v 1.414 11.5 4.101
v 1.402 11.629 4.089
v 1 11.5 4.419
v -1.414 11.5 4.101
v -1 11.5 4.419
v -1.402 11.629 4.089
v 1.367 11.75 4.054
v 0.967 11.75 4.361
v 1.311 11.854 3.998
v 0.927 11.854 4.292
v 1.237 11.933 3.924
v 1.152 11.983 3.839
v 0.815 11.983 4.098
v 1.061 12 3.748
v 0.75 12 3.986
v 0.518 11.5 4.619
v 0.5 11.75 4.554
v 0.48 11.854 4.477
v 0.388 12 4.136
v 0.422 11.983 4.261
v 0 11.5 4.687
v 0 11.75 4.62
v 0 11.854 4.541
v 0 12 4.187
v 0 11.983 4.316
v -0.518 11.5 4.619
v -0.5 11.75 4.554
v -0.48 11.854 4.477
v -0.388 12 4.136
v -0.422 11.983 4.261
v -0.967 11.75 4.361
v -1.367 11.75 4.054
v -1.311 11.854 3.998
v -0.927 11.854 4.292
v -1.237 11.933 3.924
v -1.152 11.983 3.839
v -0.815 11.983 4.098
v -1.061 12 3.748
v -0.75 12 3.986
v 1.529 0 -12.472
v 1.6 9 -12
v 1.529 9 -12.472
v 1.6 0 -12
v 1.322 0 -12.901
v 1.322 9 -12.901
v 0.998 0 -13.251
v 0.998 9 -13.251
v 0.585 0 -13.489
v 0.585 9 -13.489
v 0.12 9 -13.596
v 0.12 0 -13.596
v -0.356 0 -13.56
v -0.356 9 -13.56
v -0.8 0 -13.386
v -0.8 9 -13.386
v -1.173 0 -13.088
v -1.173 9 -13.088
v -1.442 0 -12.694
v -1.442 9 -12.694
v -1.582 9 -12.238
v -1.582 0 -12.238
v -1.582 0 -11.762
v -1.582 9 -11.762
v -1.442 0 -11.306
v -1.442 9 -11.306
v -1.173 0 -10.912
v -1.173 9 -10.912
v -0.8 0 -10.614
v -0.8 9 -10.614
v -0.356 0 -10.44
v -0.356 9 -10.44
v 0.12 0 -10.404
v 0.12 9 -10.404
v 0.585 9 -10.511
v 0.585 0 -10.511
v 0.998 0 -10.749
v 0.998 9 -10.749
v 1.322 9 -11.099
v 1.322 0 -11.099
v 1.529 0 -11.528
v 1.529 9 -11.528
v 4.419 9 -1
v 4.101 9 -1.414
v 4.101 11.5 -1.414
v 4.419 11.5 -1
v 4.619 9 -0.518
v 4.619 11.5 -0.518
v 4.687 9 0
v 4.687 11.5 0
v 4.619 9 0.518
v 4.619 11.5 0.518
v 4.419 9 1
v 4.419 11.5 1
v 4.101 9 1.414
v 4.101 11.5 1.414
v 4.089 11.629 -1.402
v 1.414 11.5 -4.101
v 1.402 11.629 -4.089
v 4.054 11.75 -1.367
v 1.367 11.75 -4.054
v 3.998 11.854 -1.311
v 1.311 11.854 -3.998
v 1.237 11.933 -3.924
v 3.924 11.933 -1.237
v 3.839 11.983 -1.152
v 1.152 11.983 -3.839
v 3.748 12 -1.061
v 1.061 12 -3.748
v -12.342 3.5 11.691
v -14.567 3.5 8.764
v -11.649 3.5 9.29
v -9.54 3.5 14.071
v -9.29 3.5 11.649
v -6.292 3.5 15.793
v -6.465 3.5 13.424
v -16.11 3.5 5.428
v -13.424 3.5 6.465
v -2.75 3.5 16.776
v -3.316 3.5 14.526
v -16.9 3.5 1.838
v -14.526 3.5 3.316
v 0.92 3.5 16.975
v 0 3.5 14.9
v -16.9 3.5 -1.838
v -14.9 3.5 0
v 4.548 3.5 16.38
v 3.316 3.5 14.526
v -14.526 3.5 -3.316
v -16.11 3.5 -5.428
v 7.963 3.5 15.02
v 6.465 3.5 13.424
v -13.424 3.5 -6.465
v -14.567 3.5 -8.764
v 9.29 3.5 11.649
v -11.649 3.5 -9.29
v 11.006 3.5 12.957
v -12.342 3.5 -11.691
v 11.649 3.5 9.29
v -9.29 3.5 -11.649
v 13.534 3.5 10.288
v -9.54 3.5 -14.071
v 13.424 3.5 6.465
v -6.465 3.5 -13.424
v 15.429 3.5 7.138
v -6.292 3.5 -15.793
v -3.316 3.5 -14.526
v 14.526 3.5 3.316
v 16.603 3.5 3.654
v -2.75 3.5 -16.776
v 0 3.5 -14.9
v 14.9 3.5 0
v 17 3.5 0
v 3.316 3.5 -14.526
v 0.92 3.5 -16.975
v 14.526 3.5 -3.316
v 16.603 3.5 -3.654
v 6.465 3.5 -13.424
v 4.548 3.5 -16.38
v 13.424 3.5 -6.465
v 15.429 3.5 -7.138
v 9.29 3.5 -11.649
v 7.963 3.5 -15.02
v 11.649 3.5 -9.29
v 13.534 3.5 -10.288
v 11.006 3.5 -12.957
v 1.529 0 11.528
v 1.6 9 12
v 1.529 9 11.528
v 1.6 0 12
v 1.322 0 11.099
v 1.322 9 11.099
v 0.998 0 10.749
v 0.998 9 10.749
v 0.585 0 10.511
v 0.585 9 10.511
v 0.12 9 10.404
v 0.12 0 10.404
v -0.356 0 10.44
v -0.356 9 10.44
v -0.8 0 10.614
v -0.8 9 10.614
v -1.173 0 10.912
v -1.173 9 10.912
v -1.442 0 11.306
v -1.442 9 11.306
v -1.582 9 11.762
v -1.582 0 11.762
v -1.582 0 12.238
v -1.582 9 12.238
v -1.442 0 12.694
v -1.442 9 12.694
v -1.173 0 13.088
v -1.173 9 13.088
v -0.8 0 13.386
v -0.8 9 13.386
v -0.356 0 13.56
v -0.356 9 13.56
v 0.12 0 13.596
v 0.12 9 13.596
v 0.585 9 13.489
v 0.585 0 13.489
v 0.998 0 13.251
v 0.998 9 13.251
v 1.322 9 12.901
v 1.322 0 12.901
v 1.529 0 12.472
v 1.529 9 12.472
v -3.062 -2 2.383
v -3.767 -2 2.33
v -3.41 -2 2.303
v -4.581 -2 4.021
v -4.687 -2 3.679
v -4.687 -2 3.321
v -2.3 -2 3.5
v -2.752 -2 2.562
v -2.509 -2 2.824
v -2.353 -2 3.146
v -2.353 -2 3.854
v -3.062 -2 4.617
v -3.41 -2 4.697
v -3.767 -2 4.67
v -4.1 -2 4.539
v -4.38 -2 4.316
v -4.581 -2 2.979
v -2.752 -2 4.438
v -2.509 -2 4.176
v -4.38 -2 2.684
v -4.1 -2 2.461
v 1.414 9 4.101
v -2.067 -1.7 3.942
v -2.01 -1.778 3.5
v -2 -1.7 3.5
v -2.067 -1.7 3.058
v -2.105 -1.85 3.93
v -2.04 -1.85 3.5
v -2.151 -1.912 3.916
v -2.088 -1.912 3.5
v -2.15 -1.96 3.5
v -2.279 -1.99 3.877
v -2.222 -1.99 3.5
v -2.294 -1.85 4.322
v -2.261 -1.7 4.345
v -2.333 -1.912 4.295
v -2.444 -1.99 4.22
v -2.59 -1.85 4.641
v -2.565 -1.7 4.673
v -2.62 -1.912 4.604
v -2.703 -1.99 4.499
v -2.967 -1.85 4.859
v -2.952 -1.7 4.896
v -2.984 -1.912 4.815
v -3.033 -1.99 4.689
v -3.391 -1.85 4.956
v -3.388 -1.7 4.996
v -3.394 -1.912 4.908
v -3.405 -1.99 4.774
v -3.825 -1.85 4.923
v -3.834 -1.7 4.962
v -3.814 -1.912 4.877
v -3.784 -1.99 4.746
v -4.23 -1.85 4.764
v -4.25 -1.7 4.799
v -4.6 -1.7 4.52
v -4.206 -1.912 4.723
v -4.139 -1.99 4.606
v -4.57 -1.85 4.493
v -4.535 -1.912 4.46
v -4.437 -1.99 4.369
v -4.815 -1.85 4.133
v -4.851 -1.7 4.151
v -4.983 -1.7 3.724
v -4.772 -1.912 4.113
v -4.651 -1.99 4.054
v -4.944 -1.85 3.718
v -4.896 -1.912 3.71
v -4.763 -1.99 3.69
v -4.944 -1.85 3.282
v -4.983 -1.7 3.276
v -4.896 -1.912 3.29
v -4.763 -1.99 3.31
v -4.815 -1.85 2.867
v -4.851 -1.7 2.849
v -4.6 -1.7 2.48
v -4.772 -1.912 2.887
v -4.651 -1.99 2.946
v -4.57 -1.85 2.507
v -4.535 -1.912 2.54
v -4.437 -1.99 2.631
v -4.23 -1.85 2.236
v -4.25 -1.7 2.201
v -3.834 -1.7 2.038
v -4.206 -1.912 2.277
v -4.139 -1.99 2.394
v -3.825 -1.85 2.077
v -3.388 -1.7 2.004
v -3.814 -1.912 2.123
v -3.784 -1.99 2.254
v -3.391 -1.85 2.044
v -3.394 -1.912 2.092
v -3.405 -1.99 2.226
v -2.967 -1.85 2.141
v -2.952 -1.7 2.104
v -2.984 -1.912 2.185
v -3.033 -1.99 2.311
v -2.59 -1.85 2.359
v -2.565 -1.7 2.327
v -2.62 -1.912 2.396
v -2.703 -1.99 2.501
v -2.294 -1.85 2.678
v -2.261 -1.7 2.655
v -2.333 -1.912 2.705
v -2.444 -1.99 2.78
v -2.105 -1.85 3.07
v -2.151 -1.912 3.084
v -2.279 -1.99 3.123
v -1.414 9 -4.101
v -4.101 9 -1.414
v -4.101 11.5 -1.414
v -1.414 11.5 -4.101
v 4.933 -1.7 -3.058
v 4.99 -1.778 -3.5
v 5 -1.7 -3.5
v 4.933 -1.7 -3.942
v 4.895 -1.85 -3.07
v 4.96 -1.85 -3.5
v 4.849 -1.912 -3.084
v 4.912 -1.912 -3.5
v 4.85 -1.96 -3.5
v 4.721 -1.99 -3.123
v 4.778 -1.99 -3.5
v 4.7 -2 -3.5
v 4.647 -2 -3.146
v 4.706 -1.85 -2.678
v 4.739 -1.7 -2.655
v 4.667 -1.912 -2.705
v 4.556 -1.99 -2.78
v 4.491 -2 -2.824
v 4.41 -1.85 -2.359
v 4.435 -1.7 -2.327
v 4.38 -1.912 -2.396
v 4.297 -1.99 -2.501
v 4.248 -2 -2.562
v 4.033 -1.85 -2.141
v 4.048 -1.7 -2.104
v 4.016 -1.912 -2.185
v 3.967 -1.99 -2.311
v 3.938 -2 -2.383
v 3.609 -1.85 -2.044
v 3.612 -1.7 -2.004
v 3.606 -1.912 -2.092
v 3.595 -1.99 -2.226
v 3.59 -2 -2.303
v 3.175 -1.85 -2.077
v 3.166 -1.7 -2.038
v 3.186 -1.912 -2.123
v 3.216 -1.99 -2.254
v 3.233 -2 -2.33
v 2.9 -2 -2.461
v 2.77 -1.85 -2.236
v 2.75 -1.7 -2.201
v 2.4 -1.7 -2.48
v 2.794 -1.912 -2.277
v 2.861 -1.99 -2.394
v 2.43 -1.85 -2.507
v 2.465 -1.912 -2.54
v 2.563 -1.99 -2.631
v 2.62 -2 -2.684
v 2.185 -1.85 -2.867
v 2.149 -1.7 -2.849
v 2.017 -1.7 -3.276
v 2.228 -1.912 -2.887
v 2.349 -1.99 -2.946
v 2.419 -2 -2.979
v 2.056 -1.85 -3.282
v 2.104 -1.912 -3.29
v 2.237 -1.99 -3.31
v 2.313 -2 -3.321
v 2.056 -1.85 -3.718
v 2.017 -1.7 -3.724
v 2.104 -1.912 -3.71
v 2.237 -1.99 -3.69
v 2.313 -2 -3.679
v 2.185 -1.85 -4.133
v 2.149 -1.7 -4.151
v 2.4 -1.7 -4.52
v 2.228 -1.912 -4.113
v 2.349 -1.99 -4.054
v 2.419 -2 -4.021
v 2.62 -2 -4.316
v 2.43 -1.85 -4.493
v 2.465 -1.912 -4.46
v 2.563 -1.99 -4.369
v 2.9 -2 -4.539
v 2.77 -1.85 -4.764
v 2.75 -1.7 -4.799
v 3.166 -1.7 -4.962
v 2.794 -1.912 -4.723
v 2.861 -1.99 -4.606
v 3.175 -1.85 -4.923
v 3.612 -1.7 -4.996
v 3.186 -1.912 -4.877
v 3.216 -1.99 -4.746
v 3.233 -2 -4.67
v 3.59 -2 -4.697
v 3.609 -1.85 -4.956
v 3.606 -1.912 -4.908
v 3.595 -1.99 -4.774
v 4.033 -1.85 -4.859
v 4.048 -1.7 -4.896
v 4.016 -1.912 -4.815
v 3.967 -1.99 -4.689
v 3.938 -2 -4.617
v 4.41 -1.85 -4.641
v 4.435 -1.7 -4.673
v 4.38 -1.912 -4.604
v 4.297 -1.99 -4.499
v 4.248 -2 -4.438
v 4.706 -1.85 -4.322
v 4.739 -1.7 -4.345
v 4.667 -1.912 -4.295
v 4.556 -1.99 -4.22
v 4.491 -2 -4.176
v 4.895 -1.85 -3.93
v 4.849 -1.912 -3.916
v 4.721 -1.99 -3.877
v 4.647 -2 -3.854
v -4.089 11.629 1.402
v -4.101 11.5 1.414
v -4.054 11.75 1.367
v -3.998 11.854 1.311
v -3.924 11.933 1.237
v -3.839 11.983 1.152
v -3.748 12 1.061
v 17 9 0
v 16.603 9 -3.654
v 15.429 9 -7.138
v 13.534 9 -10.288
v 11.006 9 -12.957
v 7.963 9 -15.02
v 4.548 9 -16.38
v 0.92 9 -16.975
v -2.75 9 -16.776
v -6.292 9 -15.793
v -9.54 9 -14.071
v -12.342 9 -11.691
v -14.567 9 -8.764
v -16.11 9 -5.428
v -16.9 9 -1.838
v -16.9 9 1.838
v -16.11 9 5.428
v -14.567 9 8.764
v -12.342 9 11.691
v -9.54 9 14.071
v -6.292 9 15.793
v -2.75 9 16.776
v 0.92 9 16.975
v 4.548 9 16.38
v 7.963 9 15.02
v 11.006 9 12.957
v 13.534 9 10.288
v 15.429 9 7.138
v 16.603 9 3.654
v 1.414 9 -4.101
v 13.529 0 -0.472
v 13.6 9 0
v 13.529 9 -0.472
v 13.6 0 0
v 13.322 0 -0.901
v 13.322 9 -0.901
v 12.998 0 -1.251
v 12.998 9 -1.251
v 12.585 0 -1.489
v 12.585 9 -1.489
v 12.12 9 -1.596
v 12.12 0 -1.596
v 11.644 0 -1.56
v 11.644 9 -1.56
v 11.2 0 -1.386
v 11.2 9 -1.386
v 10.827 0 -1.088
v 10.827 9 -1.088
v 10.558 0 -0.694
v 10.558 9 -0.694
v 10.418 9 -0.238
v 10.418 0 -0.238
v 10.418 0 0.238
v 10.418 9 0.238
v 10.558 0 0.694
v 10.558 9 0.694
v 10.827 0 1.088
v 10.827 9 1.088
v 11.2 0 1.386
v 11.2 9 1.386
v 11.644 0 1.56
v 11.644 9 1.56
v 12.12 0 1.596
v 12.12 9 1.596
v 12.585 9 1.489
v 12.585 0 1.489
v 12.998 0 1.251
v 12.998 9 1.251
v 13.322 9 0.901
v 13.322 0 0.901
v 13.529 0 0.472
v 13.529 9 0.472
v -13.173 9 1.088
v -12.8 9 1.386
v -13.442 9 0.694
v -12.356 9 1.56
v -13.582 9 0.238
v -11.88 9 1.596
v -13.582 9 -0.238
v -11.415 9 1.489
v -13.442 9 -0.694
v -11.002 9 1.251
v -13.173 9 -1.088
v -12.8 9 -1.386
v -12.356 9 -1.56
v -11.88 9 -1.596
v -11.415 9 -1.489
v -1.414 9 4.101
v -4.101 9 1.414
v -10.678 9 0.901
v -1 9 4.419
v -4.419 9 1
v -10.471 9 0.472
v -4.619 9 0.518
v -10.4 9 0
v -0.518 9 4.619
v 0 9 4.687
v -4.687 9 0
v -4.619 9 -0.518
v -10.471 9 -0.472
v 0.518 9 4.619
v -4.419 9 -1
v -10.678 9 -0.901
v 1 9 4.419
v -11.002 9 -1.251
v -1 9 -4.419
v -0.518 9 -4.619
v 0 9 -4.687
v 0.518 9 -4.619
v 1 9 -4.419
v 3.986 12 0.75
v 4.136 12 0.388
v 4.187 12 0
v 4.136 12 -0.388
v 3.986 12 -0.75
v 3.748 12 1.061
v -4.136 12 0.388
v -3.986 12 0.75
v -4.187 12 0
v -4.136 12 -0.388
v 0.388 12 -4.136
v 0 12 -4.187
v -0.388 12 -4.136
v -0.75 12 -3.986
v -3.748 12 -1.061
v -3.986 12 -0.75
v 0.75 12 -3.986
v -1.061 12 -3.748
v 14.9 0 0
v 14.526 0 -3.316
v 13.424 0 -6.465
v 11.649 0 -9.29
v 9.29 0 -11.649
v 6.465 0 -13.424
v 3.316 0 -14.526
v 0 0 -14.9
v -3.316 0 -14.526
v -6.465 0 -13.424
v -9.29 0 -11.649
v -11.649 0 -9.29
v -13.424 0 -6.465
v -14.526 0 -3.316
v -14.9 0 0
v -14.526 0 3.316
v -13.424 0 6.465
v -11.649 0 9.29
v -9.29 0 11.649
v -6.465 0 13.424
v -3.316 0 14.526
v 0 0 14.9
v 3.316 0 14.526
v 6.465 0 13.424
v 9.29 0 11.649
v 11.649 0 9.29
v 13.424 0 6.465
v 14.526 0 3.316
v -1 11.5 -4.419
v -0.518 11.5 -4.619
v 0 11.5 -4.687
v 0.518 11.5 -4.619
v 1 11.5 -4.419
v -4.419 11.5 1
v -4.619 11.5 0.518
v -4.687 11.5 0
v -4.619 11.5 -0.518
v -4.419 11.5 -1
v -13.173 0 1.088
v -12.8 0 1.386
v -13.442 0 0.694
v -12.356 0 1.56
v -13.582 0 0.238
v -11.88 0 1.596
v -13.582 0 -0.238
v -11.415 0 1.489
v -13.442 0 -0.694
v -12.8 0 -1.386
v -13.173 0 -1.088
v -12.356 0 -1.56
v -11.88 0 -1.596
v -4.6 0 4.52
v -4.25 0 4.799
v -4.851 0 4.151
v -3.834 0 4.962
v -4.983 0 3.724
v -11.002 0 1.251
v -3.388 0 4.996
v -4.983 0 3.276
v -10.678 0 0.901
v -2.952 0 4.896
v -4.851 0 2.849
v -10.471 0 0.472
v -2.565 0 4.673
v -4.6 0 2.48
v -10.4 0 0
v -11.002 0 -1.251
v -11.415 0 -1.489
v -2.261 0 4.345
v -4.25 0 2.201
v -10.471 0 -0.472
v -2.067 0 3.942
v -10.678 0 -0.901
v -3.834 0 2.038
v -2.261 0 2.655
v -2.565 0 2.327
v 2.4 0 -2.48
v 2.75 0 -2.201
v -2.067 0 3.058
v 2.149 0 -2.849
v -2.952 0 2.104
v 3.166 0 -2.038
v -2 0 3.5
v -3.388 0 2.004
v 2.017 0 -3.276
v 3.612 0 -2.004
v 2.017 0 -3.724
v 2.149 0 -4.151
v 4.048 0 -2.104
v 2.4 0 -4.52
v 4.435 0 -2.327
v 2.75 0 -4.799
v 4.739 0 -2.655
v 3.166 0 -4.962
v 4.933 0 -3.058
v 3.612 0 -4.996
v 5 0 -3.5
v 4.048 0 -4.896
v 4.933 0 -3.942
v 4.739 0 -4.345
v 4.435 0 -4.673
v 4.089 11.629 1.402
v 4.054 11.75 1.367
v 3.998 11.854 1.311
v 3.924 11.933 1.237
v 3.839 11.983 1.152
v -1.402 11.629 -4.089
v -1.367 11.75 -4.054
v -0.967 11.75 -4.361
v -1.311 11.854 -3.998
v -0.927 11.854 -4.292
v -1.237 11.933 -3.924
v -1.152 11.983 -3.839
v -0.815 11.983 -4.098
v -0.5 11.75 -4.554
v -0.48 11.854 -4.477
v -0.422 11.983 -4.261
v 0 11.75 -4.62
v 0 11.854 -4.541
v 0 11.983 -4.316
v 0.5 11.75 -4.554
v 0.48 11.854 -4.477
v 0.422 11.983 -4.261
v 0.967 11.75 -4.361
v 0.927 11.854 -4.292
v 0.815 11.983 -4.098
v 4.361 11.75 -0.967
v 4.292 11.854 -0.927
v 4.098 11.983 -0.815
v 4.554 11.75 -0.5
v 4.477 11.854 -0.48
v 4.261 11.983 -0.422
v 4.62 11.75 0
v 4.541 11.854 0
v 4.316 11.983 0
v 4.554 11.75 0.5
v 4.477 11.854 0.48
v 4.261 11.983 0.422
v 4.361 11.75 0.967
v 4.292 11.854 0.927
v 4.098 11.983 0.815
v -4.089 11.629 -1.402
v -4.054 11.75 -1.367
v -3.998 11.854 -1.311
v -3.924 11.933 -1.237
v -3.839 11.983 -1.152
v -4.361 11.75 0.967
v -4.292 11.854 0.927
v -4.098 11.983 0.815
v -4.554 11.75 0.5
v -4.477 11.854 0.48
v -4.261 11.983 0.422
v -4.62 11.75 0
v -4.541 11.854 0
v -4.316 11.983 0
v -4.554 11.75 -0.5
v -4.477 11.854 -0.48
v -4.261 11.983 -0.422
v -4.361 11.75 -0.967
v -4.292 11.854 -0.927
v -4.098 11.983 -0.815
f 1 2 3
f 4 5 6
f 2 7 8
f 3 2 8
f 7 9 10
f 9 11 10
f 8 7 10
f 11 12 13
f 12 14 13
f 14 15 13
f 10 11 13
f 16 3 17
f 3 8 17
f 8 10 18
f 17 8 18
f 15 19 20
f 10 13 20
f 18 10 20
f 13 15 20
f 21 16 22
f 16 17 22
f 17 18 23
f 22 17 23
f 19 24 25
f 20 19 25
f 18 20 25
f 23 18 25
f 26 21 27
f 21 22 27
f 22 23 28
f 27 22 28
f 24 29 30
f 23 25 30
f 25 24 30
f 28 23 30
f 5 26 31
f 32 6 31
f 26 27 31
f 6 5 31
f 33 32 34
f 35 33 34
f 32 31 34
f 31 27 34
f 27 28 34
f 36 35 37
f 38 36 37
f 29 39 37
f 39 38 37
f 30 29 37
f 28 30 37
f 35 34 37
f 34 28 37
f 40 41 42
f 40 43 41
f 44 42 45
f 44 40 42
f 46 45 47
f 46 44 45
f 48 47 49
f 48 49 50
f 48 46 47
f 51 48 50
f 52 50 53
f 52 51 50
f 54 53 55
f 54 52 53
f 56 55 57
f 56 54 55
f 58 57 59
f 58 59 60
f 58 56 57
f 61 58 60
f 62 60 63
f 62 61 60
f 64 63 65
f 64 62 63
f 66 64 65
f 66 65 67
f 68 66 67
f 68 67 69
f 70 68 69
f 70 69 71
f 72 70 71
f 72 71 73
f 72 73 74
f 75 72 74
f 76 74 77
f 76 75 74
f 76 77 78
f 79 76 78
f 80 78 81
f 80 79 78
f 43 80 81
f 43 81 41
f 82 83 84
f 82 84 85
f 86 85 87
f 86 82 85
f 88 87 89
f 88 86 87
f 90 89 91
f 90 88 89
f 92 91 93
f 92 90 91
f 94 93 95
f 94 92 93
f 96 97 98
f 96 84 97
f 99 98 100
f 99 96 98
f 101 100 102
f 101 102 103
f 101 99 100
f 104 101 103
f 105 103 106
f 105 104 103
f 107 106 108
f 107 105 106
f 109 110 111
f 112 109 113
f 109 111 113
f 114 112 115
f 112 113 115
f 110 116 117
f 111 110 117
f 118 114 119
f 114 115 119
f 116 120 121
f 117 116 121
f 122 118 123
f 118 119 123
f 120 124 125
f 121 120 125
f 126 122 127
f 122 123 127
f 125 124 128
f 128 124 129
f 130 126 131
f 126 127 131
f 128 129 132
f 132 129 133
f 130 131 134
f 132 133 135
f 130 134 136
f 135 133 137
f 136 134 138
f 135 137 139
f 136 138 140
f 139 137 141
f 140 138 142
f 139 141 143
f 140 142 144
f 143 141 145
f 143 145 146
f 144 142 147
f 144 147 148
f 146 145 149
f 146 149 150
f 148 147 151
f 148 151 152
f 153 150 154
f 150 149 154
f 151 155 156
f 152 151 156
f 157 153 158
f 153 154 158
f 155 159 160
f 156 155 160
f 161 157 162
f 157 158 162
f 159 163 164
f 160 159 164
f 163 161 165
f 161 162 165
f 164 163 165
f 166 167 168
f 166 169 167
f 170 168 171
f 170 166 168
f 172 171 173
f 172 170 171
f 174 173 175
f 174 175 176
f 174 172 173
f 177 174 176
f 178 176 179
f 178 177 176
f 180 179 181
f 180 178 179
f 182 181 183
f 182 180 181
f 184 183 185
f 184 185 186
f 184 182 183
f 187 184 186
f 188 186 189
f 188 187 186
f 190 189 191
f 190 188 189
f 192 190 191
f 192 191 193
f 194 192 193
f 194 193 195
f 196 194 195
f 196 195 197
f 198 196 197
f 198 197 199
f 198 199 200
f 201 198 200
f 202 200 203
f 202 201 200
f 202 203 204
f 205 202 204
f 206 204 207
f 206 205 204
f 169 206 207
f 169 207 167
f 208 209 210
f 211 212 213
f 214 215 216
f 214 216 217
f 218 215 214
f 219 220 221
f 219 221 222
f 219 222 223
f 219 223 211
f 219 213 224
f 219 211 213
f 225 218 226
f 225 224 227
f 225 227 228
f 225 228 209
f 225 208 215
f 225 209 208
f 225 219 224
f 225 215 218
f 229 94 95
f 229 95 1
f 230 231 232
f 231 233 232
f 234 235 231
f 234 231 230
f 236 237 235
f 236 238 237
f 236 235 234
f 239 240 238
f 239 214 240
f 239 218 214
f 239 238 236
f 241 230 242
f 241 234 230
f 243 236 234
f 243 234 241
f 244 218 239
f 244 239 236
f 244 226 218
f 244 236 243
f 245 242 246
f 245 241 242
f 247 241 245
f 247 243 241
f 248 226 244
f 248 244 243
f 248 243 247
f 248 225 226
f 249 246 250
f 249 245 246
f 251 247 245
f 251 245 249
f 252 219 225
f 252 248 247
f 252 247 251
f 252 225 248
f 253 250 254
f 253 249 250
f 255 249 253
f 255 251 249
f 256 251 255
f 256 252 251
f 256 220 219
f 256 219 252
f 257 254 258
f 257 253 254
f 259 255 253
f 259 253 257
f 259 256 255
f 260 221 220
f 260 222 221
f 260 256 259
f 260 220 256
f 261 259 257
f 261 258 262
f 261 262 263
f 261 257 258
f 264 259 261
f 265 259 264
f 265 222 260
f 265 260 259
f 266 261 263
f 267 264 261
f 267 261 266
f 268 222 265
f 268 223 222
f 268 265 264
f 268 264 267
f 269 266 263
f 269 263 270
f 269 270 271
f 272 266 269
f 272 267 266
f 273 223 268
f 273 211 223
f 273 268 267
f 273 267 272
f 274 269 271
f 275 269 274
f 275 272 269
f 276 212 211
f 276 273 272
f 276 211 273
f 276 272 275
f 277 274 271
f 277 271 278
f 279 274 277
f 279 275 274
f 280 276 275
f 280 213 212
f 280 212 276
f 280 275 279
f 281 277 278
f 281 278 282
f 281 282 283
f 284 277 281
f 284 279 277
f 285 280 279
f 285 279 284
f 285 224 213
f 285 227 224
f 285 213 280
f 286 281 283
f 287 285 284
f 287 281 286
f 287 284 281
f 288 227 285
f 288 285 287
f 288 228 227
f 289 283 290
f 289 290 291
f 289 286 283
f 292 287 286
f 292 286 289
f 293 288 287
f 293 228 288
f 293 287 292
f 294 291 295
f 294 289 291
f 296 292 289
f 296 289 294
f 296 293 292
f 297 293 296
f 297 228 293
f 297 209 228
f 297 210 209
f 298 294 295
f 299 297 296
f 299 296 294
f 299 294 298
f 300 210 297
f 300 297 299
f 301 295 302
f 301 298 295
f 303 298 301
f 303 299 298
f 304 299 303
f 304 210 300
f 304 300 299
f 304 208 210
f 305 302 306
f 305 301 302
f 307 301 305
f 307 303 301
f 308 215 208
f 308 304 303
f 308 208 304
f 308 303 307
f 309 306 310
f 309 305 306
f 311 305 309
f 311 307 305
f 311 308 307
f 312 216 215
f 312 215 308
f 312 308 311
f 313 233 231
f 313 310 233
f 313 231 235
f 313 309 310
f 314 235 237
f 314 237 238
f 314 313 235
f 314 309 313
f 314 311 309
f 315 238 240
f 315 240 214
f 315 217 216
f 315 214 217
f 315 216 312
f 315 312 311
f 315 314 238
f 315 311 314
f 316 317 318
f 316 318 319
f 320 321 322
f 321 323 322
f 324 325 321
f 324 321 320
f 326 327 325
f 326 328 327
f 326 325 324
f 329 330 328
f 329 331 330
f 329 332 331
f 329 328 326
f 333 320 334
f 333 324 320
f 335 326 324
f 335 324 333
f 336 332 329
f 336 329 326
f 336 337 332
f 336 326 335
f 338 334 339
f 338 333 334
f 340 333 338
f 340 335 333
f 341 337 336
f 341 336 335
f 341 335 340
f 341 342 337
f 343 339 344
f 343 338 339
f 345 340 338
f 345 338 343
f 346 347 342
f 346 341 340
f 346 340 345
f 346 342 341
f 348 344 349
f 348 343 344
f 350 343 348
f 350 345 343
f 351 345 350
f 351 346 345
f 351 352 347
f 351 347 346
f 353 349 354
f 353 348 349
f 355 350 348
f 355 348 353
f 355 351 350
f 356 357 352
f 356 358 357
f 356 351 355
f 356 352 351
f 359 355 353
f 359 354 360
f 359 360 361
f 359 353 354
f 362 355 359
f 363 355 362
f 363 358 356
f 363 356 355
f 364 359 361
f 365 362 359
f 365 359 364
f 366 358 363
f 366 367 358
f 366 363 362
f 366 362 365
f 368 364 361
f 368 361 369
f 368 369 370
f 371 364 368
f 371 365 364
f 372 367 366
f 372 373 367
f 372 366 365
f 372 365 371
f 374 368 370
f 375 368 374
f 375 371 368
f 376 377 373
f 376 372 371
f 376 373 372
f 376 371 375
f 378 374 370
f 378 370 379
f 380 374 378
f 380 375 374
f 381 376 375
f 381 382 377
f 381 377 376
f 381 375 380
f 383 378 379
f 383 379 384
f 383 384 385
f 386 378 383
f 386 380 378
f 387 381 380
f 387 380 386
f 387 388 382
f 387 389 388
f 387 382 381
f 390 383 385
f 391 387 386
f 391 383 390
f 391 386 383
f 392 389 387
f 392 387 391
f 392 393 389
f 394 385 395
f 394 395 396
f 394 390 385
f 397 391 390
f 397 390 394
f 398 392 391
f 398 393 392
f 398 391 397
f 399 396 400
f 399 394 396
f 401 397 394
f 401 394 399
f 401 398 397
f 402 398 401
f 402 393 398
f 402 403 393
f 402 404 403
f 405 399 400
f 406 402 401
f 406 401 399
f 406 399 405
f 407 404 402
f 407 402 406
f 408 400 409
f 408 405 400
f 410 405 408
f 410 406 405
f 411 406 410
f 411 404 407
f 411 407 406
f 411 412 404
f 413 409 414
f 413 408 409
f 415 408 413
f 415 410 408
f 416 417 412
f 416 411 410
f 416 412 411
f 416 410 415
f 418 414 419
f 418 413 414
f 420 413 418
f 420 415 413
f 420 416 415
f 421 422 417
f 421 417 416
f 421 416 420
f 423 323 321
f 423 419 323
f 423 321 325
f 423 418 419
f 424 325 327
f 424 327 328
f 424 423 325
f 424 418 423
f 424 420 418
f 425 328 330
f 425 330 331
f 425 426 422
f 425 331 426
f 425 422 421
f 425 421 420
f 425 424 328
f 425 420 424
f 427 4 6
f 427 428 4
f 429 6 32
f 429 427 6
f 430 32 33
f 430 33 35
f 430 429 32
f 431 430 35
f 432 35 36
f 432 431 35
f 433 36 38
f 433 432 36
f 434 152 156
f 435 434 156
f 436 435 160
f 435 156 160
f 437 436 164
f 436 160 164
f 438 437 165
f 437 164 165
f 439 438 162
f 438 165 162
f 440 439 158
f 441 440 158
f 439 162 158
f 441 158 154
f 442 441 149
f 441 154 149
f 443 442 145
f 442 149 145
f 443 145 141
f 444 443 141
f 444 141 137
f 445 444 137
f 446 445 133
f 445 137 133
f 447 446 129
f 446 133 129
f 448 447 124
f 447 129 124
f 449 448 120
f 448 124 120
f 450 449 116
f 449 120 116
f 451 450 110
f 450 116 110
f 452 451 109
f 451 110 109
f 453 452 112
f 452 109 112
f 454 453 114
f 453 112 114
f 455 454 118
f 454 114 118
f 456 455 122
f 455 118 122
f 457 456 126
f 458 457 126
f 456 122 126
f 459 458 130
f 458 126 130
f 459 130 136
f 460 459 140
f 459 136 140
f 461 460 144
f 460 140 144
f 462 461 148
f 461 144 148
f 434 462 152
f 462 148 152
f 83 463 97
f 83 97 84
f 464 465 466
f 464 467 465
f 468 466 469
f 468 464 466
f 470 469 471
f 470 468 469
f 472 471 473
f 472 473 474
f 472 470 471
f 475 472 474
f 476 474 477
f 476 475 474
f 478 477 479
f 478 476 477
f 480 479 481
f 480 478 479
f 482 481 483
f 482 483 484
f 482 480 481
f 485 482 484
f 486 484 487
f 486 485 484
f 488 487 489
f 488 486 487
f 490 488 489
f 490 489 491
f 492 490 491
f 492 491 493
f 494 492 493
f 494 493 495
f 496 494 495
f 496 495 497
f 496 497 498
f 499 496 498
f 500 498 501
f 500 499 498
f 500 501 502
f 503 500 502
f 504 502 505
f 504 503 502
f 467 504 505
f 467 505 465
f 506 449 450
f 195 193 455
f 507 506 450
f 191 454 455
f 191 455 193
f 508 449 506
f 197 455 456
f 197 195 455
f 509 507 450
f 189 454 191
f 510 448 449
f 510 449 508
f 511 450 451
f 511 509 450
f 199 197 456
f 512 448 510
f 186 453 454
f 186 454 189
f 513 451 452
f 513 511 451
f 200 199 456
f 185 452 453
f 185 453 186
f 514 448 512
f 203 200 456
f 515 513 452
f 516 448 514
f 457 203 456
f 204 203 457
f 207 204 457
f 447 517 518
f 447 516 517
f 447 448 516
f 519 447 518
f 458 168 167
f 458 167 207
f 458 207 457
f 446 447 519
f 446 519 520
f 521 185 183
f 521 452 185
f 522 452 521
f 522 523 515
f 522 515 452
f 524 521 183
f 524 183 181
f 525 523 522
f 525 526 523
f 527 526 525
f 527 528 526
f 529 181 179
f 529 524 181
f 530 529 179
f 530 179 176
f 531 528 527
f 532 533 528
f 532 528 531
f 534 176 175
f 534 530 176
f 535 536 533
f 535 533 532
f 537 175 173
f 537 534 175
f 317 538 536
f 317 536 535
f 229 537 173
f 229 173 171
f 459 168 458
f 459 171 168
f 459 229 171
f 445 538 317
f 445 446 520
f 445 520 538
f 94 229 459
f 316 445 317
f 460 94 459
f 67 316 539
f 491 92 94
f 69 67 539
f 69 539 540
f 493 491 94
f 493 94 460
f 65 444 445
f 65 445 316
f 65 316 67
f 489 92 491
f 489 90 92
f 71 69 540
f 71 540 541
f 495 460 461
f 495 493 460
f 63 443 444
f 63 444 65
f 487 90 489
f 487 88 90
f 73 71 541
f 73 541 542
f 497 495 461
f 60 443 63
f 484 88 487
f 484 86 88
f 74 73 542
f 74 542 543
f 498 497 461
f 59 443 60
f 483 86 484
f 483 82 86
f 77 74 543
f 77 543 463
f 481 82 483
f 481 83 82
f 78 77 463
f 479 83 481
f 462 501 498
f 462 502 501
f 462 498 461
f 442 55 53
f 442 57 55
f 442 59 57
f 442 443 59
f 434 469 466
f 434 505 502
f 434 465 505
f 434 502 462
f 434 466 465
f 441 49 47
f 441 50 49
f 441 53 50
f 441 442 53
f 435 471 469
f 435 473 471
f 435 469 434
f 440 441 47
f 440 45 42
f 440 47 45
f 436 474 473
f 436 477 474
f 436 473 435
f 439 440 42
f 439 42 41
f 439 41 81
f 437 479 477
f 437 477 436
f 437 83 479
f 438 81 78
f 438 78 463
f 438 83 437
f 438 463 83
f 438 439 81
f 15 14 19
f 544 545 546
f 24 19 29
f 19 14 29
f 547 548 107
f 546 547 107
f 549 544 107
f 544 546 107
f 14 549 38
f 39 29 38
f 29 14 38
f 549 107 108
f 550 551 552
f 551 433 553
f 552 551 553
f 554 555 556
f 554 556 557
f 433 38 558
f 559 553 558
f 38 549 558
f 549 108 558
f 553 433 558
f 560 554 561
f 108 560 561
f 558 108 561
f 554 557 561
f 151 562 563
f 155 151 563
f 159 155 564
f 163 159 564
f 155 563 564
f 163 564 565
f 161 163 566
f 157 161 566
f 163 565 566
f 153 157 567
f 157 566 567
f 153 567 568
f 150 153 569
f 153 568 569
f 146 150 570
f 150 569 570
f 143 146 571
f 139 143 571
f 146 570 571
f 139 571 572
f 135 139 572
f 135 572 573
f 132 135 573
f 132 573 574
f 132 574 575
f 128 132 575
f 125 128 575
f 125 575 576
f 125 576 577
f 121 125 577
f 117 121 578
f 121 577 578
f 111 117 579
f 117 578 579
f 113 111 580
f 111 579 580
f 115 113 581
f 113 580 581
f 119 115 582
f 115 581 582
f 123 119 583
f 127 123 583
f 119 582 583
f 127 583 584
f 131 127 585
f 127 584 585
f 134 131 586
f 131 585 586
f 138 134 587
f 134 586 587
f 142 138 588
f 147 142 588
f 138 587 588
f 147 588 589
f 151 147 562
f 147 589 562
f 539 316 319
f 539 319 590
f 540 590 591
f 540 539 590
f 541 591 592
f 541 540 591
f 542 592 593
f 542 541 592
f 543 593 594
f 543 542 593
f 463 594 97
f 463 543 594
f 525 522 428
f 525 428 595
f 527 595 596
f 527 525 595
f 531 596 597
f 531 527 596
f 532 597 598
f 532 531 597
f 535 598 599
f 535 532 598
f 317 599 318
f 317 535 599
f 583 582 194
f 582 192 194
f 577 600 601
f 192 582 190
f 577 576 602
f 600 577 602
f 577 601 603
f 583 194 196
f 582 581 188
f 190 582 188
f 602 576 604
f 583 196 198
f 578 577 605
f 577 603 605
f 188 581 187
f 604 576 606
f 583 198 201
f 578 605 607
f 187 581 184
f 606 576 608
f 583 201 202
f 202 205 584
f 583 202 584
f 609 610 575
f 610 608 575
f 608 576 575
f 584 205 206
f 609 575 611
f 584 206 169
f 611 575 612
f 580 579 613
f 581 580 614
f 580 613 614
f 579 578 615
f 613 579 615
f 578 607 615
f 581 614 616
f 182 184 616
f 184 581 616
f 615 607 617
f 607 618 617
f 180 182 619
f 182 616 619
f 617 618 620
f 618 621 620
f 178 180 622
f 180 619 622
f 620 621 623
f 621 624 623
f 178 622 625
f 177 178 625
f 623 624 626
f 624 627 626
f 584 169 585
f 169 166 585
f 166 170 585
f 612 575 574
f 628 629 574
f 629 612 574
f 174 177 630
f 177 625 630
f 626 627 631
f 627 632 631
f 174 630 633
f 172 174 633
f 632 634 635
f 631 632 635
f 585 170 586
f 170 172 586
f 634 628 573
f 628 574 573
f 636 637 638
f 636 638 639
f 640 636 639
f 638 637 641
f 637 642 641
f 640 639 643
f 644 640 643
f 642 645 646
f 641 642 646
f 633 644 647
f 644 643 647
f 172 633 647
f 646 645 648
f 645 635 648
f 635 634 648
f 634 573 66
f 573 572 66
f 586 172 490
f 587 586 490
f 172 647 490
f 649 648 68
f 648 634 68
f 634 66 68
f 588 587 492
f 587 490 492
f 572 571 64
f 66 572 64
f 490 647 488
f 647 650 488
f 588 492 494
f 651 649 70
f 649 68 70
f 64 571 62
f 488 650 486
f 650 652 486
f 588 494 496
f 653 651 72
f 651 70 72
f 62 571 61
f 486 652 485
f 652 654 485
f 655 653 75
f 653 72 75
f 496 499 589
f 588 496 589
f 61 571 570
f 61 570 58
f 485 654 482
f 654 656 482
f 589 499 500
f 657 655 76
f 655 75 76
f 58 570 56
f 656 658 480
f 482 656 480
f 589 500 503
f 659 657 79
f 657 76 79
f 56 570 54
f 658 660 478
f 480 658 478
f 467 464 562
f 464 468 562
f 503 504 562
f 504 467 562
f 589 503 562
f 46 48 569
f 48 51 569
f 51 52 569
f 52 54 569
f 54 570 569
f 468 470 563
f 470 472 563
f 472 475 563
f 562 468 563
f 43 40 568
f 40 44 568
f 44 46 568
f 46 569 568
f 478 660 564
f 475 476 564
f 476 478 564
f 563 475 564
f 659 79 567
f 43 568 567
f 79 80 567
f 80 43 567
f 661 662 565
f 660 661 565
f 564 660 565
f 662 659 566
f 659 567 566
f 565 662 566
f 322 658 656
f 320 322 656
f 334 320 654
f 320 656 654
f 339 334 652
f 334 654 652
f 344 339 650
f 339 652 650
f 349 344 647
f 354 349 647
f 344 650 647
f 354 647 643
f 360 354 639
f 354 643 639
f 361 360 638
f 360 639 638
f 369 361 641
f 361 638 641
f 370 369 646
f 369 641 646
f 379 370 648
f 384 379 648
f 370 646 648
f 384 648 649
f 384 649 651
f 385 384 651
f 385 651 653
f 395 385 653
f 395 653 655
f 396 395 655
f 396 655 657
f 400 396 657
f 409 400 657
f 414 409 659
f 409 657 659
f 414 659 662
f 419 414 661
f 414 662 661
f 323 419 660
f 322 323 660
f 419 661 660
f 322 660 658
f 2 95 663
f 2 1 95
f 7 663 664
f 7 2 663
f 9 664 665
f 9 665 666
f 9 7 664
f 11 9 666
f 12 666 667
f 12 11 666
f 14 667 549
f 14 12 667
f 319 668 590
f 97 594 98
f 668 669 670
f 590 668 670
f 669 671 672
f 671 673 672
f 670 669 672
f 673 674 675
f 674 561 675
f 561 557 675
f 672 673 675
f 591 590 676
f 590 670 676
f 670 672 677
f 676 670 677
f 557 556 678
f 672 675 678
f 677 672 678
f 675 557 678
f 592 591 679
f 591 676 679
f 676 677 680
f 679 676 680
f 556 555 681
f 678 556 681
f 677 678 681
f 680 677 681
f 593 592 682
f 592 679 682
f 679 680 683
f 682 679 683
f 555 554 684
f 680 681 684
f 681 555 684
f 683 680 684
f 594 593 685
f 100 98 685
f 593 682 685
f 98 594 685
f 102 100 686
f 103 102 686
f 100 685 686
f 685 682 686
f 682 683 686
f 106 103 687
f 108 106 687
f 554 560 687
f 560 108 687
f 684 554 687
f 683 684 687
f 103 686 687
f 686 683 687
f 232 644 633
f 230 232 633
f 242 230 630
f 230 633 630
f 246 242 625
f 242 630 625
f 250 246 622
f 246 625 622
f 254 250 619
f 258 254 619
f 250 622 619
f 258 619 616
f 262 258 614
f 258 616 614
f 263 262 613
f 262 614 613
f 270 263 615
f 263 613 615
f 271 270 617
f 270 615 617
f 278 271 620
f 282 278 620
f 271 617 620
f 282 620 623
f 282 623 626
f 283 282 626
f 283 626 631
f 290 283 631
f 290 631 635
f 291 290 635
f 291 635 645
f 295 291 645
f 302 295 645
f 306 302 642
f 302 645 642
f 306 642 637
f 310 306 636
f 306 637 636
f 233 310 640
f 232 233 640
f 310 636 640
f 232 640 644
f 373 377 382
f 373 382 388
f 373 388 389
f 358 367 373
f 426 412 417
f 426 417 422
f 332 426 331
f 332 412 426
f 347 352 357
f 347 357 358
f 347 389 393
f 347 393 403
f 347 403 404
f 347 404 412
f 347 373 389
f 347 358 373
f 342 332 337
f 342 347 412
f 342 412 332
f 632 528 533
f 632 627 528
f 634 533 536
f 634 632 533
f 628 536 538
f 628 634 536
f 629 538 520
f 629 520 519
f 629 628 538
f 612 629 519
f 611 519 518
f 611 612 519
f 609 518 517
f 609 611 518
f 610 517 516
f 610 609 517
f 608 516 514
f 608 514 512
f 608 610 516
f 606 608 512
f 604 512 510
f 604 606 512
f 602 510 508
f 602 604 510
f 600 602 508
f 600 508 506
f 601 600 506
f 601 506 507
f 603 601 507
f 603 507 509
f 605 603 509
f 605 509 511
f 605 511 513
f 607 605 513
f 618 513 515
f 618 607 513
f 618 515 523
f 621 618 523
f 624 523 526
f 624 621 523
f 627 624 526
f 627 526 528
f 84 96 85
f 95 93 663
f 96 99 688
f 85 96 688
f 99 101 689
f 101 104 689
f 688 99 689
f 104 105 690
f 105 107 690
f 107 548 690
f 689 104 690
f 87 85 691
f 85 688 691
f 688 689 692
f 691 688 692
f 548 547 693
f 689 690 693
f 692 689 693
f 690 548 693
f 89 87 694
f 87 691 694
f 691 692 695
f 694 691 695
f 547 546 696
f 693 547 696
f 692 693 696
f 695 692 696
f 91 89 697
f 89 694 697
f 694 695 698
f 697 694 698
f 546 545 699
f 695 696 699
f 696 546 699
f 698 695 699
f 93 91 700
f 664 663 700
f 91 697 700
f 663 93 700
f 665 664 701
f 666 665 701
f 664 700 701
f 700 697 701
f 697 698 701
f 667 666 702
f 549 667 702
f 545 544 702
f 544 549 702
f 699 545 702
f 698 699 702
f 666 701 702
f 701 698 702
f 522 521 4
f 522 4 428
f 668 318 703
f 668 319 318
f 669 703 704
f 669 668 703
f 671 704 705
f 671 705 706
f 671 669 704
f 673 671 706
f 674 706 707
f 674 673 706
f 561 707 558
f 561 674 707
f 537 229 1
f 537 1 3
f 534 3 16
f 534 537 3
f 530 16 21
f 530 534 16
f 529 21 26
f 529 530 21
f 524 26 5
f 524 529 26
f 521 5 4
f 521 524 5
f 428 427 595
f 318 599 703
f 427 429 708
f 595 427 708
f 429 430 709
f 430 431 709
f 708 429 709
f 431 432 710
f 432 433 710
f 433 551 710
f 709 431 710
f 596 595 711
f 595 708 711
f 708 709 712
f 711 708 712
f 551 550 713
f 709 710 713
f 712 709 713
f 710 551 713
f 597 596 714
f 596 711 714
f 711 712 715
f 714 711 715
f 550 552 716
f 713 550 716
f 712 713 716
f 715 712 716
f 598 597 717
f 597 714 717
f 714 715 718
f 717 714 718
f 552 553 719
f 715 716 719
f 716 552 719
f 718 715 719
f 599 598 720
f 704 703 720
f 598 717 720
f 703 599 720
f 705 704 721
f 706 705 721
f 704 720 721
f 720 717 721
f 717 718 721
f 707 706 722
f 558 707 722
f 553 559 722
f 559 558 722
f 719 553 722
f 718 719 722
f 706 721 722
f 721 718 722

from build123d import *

# Parameters (mm, degrees)
SKETCH1_R           = 14.9
SKETCH1_R_2         = 1.6
BOSS_EXTRUDE1_DEPTH = 3.5
SKETCH2_R           = 1.5
BOSS_EXTRUDE2_DEPTH = 2
FILLET1_R           = 0.3
SKETCH3_R           = 17
SKETCH3_R_2         = 1.6
BOSS_EXTRUDE3_DEPTH = 5.5
BOSS_EXTRUDE4_DEPTH = 3
FILLET2_R           = 0.5


with BuildPart() as part:
    # Sketch1 → Boss-Extrude1 (new body)
    with BuildSketch(Plane(origin=(0, 0, 0), x_dir=(1, 0, 0), z_dir=(0, 1, 0))):
        Circle(SKETCH1_R)
        with Locations((0, 12)):
            Circle(SKETCH1_R_2, mode=Mode.SUBTRACT)
        with Locations((12, 0)):
            Circle(SKETCH1_R_2, mode=Mode.SUBTRACT)
        with Locations((0, -12)):
            Circle(SKETCH1_R_2, mode=Mode.SUBTRACT)
        with Locations((-12, 0)):
            Circle(SKETCH1_R_2, mode=Mode.SUBTRACT)
    extrude(amount=BOSS_EXTRUDE1_DEPTH)

    # Sketch2 → Boss-Extrude2 (add)
    with BuildSketch(Plane.XZ):
        with Locations((3.5, -3.5)):
            Circle(SKETCH2_R)
        with Locations((-3.5, 3.5)):
            Circle(SKETCH2_R)
    extrude(amount=BOSS_EXTRUDE2_DEPTH)

    # Fillet1
    fillet1_edges = [part.edges().sort_by_distance(p)[0] for p in [
        (2, -2, -3.5),
        (-5, -2, 3.5),
    ]]
    fillet(fillet1_edges, radius=FILLET1_R)

    # Sketch3 → Boss-Extrude3 (add)
    with BuildSketch(Plane(origin=(0, 3.5, 0), x_dir=(1, 0, 0), z_dir=(0, 1, 0))):
        Circle(SKETCH3_R)
        with Locations((12, 0)):
            Circle(SKETCH3_R_2, mode=Mode.SUBTRACT)
        with Locations((0, -12)):
            Circle(SKETCH3_R_2, mode=Mode.SUBTRACT)
        with Locations((-12, 0)):
            Circle(SKETCH3_R_2, mode=Mode.SUBTRACT)
        with Locations((0, 12)):
            Circle(SKETCH3_R_2, mode=Mode.SUBTRACT)
    extrude(amount=BOSS_EXTRUDE3_DEPTH)

    # Sketch4 → Boss-Extrude4 (add)
    with BuildSketch(Plane(origin=(0, 9, 0), x_dir=(1, 0, 0), z_dir=(0, 1, 0))):
        with BuildLine():
            Line((-4.101219331, 1.414213562), (-1.414213562, 4.101219331))
            ThreePointArc((-1.414213562, 4.101219331), (0, 4.687005769), (1.414213562, 4.101219331))
            Line((1.414213562, 4.101219331), (4.101219331, 1.414213562))
            ThreePointArc((4.101219331, 1.414213562), (4.687005769, 0), (4.101219331, -1.414213562))
            Line((4.101219331, -1.414213562), (1.414213562, -4.101219331))
            ThreePointArc((1.414213562, -4.101219331), (0, -4.687005769), (-1.414213562, -4.101219331))
            Line((-1.414213562, -4.101219331), (-4.101219331, -1.414213562))
            ThreePointArc((-4.101219331, -1.414213562), (-4.687005769, 0), (-4.101219331, 1.414213562))
        make_face()
    extrude(amount=BOSS_EXTRUDE4_DEPTH)

    # Fillet2
    fillet2_edges = [part.edges().sort_by_distance(p)[0] for p in [
        (4.687005769, 12, 0),
        (2.757716447, 12, -2.757716447),
        (0, 12, -4.687005769),
        (-2.757716447, 12, -2.757716447),
        (-4.687005769, 12, 0),
        (-2.757716447, 12, 2.757716447),
        (0, 12, 4.687005769),
        (2.757716447, 12, 2.757716447),
    ]]
    fillet(fillet2_edges, radius=FILLET2_R)


solid = part.part
